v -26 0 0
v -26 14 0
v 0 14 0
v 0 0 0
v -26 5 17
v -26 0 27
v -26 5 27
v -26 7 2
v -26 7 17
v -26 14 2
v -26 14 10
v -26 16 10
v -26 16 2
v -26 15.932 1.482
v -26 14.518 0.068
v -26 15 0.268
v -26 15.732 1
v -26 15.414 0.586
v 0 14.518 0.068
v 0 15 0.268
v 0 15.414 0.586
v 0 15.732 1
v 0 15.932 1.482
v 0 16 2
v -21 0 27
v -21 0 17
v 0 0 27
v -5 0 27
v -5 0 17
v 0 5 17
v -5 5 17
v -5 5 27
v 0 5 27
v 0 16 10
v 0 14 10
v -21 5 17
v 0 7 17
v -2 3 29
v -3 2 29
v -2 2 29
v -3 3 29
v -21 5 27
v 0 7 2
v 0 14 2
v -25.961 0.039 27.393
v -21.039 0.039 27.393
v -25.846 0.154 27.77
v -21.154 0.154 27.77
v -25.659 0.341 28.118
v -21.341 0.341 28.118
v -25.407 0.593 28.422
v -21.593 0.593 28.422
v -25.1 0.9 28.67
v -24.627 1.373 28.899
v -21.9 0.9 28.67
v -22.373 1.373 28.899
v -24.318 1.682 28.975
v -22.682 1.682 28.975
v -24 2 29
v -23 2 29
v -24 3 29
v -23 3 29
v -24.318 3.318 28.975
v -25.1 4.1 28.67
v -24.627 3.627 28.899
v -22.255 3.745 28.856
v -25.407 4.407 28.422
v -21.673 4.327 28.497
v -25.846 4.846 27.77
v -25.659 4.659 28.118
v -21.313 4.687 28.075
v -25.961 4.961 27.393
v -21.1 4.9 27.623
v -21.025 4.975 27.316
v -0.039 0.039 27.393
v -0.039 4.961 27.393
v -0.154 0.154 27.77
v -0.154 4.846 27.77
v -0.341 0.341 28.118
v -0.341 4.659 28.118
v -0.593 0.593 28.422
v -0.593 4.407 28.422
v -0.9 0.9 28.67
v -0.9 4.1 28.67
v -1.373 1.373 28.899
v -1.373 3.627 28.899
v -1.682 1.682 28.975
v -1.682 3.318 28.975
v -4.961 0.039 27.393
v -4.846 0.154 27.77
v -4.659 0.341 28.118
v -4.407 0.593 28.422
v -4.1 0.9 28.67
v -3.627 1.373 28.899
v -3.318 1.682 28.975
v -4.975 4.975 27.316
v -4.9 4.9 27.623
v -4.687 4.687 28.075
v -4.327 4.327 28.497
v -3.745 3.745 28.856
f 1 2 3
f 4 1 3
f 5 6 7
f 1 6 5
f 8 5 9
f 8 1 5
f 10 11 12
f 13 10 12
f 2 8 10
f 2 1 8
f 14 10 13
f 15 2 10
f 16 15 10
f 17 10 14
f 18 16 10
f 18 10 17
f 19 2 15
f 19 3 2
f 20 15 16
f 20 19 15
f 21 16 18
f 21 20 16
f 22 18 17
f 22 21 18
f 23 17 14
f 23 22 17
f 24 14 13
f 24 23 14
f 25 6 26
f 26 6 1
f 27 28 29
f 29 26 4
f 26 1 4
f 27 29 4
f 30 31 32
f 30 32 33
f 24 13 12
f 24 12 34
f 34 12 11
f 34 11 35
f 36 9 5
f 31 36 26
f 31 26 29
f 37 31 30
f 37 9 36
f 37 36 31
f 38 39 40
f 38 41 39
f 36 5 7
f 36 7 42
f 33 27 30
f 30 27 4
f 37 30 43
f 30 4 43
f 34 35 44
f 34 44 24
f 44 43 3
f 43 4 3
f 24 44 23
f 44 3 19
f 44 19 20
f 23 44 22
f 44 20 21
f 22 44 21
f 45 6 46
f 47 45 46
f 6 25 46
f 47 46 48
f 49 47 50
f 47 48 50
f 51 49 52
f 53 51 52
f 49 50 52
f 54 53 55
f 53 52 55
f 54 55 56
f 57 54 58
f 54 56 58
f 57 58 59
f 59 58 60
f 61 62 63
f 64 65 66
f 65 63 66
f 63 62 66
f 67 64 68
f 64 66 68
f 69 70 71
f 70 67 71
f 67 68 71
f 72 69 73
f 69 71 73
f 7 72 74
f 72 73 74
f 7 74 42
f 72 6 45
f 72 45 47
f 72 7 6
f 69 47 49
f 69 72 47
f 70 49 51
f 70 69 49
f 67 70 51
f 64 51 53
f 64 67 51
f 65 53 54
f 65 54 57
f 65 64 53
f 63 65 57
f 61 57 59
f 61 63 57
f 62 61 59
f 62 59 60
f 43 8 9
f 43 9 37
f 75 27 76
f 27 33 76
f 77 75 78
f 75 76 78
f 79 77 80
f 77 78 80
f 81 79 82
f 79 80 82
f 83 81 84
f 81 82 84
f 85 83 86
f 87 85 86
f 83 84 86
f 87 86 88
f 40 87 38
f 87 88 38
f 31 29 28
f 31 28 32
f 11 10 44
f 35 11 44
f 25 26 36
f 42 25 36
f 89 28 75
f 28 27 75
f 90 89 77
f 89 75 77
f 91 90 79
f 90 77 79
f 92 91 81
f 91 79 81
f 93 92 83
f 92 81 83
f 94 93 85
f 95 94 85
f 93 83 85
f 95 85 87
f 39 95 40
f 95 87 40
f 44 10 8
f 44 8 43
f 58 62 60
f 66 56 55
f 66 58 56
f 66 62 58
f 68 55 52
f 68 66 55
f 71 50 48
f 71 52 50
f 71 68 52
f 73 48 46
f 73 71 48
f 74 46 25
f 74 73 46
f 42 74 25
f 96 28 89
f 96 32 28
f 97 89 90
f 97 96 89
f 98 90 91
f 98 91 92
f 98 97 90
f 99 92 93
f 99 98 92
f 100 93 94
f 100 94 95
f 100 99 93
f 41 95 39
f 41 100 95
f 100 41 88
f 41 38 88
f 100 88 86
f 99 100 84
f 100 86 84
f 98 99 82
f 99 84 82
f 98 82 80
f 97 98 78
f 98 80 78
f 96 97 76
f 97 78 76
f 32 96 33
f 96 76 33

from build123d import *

# Parameters (mm, degrees)
F0_W     = 26
F0_H     = 16
F1_DEPTH = 2
F2_W     = 26
F2_H     = 7
F3_DEPTH = 15
F2_H_2   = 2
F4_DEPTH = 8
F5_W     = 5
F5_H     = 5
F6_DEPTH = 12
F7_R     = 2
F8_R     = 2


with BuildPart() as f1:
    # F0 (on Top) → F1 (new body)
    with BuildSketch(Plane.XY):
        with Locations((-13, 8)):
            Rectangle(F0_W, F0_H)
    extrude(amount=F1_DEPTH)

    # F2 (on face) → F3 (join)
    with BuildSketch(Plane.XY.offset(2)):
        with Locations((-13, 3.5)):
            Rectangle(F2_W, F2_H)
    extrude(amount=F3_DEPTH)

    # F2 (on face) → F4 (join)
    with BuildSketch(Plane.XY.offset(2)):
        with Locations((-13, 15)):
            Rectangle(F2_W, F2_H_2)
    extrude(amount=F4_DEPTH)

    # F5 (on face) → F6 (join)
    with BuildSketch(Plane.XY.offset(17)):
        with Locations((-23.5, 2.5)):
            Rectangle(F5_W, F5_H)
        with Locations((-2.5, 2.5)):
            Rectangle(F5_W, F5_H)
    extrude(amount=F6_DEPTH)

    # F7
    f7_edges = [f1.edges().sort_by_distance(p)[0] for p in [
        (-13, 16, 0),
    ]]
    fillet(f7_edges, radius=F7_R)

    # F8
    f8_edges = [f1.edges().sort_by_distance(p)[0] for p in [
        (-26, 2.5, 29),
        (-23.5, 0, 29),
        (-21, 2.5, 29),
        (-23.5, 5, 29),
        (-2.5, 0, 29),
        (0, 2.5, 29),
        (-2.5, 5, 29),
        (-5, 2.5, 29),
    ]]
    fillet(f8_edges, radius=F8_R)


solid = f1.part
